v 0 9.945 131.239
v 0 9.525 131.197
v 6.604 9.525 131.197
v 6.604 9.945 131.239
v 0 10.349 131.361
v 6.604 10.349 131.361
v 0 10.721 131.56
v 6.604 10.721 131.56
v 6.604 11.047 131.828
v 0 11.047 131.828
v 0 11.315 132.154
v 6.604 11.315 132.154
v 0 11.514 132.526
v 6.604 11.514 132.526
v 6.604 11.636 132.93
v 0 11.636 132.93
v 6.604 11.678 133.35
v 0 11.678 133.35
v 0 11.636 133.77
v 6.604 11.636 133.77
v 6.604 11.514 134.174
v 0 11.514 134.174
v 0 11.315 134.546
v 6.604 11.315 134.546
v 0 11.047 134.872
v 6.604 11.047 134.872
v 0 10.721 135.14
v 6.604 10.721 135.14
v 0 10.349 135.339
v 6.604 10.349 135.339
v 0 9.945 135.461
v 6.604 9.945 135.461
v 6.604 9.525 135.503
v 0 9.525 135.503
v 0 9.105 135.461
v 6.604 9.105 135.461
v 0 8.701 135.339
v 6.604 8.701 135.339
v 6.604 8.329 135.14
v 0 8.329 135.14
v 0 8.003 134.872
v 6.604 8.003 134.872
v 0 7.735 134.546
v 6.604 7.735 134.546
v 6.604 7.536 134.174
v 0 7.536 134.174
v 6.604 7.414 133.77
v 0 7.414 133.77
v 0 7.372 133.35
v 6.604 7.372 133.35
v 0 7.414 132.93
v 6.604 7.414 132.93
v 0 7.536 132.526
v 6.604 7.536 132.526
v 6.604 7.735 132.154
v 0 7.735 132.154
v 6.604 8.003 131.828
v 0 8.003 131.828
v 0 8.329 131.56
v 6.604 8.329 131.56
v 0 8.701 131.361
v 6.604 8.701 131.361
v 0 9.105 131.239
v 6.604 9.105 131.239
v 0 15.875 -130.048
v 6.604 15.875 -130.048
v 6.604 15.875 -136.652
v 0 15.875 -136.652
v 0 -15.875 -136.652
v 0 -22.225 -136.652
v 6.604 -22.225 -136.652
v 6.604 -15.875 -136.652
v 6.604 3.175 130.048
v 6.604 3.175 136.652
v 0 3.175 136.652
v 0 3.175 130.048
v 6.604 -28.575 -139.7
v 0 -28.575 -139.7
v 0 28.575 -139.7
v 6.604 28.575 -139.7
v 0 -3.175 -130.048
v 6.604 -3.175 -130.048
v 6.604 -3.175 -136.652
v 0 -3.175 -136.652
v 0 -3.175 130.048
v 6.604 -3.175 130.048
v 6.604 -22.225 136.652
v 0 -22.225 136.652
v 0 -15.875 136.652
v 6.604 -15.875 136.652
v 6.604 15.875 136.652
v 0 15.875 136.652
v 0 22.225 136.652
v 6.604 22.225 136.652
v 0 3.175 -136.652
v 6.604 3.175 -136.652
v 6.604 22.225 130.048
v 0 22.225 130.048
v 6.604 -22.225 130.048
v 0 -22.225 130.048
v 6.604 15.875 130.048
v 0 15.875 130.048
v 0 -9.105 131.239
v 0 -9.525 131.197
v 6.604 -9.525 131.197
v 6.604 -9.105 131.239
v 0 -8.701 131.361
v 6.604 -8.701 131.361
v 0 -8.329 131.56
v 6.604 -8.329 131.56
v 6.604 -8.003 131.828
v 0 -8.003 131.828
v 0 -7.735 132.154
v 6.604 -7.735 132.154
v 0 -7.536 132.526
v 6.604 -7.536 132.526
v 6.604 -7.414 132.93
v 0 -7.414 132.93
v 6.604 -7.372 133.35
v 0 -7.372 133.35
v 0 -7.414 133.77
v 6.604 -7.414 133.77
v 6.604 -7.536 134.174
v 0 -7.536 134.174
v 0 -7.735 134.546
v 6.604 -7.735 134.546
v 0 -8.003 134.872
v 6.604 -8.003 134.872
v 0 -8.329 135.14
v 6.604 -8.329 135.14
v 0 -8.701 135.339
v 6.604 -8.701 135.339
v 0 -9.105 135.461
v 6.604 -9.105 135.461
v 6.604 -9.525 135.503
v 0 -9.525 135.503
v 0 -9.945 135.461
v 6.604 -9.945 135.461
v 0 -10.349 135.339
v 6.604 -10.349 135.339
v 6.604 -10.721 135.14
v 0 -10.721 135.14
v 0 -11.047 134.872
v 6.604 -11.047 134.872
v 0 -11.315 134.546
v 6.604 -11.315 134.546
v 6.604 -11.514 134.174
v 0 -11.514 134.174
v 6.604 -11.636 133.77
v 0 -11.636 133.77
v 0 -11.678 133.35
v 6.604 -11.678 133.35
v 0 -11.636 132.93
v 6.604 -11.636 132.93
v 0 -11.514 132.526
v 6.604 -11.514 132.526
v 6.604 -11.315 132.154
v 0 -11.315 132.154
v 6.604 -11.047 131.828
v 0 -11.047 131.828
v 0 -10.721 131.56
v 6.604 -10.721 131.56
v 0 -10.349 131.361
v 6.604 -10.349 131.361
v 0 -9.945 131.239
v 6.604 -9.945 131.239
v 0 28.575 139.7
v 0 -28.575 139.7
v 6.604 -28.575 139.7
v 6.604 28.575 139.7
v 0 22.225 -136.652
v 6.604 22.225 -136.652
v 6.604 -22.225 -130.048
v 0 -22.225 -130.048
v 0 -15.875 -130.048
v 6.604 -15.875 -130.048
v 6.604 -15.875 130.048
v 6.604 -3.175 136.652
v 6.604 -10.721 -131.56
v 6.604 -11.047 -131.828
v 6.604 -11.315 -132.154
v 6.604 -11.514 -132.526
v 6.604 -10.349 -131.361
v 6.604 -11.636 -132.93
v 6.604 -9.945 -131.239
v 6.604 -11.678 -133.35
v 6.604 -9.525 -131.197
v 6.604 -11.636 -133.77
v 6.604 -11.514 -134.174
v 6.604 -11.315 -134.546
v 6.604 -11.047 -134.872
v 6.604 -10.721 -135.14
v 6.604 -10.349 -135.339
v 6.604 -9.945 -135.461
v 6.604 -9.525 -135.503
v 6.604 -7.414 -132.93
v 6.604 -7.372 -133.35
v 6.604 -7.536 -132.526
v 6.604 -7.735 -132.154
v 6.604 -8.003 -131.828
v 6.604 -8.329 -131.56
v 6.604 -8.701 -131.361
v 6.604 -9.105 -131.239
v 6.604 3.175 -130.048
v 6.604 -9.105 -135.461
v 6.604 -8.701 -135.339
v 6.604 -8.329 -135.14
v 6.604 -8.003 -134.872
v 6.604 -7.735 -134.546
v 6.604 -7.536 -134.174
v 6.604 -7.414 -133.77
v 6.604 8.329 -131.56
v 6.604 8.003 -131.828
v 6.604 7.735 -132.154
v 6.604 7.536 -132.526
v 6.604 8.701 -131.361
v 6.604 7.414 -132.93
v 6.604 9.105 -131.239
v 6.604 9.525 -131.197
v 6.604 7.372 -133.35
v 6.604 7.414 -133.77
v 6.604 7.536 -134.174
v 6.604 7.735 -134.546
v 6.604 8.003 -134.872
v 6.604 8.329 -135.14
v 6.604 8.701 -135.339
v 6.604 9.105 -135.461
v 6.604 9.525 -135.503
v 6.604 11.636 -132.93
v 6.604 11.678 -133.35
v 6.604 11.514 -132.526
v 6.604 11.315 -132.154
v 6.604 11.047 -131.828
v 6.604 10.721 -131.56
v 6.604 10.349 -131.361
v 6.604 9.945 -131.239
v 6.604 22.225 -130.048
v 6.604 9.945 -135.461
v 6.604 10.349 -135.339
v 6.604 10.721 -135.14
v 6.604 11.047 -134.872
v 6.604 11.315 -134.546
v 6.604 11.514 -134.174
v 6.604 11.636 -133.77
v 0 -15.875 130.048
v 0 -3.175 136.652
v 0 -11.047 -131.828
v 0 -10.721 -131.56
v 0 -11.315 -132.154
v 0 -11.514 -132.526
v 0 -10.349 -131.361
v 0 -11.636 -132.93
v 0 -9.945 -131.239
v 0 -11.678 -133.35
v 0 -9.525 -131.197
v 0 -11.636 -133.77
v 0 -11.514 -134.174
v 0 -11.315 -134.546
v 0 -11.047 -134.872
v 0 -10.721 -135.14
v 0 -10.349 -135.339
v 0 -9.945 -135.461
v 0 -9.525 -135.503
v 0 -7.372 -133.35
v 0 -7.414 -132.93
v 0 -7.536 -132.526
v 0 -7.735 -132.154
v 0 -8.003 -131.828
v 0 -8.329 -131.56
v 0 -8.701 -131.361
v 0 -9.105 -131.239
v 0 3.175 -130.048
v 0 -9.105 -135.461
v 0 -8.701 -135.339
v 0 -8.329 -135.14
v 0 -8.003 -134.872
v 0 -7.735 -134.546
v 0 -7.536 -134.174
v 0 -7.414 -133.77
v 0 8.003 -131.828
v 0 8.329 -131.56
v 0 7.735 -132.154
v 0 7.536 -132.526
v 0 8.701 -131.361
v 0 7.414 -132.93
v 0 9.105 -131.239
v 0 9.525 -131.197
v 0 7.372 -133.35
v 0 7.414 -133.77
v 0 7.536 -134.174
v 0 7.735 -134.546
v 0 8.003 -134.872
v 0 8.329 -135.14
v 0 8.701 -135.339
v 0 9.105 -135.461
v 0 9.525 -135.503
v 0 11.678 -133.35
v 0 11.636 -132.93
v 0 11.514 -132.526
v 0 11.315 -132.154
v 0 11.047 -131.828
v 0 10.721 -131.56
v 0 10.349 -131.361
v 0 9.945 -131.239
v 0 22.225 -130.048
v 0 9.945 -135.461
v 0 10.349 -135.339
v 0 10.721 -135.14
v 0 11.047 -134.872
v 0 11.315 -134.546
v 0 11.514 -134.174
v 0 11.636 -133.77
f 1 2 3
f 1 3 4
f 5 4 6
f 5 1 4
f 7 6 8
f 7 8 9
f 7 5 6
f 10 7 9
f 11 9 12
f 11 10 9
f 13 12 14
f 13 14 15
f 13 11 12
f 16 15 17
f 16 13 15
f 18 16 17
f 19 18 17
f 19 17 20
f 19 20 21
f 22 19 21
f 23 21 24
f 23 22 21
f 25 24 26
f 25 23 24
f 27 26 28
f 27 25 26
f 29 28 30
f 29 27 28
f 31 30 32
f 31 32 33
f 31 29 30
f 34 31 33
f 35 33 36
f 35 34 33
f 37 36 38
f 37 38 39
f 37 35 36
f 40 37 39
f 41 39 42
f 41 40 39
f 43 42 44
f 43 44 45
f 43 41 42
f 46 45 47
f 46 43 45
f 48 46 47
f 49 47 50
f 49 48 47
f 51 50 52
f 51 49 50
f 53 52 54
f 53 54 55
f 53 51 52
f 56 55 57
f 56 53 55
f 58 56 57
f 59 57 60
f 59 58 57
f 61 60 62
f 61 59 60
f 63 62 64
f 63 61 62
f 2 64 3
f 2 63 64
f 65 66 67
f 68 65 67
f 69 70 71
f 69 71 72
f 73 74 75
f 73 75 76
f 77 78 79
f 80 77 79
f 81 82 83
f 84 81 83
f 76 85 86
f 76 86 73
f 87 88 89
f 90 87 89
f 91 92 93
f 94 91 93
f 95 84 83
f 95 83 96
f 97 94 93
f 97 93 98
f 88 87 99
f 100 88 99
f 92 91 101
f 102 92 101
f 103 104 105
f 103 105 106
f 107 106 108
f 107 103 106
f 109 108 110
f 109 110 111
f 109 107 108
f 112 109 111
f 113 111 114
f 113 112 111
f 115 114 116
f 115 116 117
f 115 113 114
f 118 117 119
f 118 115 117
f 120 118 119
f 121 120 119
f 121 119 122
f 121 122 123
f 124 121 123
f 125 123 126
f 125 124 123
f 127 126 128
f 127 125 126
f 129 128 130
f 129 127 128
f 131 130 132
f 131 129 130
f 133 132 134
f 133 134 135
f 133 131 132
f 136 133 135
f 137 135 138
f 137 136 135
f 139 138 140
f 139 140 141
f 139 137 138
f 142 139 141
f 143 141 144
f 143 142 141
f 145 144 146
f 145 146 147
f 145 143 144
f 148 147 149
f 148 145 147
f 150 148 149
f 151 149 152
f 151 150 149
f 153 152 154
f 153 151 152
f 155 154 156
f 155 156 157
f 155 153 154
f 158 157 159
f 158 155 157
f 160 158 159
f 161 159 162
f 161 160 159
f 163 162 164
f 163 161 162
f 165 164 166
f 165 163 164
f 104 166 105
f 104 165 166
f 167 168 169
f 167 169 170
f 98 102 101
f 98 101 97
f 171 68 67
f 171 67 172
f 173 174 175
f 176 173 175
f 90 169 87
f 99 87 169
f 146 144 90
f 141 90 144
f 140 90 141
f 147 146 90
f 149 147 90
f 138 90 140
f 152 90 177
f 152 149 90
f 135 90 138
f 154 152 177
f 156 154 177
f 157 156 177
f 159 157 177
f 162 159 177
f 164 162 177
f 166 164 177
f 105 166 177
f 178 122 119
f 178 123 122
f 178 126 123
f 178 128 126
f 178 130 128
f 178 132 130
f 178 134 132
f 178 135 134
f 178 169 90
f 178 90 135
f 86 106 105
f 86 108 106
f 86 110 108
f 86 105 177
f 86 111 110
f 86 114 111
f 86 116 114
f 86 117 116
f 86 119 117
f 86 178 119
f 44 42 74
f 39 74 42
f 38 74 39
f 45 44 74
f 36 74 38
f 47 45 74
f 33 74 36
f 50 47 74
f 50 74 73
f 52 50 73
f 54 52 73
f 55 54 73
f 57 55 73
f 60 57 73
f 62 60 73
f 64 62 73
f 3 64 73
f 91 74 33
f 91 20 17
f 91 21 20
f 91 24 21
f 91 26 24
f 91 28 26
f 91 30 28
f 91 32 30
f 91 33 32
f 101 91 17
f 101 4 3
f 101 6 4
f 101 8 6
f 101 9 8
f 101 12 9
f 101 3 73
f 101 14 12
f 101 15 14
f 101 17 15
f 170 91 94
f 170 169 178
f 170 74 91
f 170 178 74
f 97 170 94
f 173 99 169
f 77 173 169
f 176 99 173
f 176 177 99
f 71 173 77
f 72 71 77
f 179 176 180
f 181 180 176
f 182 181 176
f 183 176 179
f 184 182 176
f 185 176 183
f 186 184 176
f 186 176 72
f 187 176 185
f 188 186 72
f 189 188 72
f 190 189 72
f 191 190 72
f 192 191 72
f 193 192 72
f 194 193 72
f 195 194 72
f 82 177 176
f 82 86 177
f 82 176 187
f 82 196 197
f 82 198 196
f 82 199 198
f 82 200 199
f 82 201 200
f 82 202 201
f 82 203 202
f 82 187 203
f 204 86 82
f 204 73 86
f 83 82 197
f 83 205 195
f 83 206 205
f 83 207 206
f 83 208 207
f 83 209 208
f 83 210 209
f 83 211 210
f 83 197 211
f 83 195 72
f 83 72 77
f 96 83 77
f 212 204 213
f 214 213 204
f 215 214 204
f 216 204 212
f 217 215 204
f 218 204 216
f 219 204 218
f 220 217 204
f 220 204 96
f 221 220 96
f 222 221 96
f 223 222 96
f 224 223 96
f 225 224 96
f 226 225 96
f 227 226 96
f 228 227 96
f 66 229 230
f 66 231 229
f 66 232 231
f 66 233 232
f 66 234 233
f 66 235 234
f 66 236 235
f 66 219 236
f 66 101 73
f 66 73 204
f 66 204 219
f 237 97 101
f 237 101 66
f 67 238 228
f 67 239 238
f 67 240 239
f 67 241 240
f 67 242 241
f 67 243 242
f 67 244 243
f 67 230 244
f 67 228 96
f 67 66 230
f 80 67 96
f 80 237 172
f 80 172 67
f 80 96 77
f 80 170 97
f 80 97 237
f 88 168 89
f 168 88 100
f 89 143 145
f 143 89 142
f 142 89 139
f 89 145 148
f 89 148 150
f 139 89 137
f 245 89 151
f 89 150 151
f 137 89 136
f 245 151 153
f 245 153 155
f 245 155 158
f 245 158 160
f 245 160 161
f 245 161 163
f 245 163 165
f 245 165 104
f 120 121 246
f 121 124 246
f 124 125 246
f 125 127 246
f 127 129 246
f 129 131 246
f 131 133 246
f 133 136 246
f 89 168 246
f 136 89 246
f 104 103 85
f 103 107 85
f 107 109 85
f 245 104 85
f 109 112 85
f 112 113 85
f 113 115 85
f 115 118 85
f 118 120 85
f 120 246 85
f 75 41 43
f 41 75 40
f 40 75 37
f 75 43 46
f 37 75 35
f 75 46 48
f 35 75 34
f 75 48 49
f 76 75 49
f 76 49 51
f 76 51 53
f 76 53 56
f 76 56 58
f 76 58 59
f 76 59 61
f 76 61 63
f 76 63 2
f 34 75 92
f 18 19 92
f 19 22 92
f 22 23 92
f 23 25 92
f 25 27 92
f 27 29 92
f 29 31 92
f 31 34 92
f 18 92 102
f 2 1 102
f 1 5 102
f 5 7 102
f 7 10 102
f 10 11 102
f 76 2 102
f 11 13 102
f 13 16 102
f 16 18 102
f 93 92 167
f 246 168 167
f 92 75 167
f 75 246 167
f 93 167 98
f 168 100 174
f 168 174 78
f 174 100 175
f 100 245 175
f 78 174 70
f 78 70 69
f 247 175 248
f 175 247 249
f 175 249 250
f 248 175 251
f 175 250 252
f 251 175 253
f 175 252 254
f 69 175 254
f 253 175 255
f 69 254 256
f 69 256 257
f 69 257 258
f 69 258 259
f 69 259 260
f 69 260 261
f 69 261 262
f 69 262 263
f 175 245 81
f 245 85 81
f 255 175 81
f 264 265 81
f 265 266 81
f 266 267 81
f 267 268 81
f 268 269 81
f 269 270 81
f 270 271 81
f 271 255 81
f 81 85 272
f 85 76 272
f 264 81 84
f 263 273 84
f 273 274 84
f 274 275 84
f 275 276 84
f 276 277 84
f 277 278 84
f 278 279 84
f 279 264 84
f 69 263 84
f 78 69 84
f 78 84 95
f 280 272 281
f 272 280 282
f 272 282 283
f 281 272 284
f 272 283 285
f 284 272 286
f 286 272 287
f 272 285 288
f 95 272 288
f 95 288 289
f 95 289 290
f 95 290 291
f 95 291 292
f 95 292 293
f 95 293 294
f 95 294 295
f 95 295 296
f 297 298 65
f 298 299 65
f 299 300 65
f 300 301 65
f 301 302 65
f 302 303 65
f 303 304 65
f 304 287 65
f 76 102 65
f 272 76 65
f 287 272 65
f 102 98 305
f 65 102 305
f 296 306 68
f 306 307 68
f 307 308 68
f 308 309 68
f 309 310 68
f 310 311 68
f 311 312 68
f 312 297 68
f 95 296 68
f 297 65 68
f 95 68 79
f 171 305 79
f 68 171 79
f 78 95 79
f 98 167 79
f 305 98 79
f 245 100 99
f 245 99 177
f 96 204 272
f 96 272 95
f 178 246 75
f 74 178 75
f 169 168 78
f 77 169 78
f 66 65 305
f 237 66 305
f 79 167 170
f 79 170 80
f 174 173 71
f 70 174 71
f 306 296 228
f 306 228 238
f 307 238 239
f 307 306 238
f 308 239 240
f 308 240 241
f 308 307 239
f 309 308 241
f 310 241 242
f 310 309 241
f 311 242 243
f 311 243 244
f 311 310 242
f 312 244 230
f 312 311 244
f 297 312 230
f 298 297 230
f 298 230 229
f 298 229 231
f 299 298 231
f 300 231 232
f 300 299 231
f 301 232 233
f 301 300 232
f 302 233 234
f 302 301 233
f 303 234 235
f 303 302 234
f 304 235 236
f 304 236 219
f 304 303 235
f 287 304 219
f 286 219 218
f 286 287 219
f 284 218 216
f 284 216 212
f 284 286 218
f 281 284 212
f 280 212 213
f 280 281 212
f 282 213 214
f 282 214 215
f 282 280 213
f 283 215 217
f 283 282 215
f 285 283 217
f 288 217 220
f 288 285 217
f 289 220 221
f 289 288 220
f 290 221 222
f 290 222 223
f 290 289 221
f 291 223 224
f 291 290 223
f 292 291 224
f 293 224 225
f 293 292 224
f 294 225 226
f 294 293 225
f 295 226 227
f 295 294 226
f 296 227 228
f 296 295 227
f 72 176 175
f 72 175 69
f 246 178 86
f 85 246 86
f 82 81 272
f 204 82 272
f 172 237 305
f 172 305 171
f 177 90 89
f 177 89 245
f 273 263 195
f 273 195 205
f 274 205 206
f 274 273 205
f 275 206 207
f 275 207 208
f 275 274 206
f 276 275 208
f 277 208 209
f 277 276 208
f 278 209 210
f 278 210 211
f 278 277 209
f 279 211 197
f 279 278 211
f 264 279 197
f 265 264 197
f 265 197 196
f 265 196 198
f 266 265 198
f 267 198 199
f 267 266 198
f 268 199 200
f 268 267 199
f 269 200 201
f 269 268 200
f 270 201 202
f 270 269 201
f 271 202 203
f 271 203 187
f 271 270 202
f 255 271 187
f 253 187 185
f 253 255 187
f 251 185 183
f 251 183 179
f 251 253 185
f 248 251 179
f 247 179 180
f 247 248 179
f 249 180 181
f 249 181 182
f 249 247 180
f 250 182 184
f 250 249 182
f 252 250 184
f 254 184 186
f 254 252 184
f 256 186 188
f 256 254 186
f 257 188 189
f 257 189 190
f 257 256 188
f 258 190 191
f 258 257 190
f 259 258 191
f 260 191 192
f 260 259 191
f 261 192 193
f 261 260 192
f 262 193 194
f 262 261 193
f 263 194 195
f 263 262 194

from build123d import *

# Parameters (mm, degrees)
SKETCH1_W           = 279.4
SKETCH1_H           = 57.15
SKETCH1_R           = 2.15265
SKETCH1_W_2         = 6.604
SKETCH1_H_2         = 6.35
BOSS_EXTRUDE1_DEPTH = 6.604


with BuildPart() as part:
    # Sketch1 → Boss-Extrude1 (new body)
    with BuildSketch(Plane(origin=(0, 0, 0), x_dir=(0, 0, -1), z_dir=(1, 0, 0))):
        Rectangle(SKETCH1_W, SKETCH1_H)
        with Locations((-133.35, 9.525)):
            Circle(SKETCH1_R, mode=Mode.SUBTRACT)
        with Locations((-133.35, -9.525)):
            Circle(SKETCH1_R, mode=Mode.SUBTRACT)
        with Locations((133.35, 9.525)):
            Circle(SKETCH1_R, mode=Mode.SUBTRACT)
        with Locations((133.35, -9.525)):
            Circle(SKETCH1_R, mode=Mode.SUBTRACT)
        with Locations((-133.35, 0)):
            Rectangle(SKETCH1_W_2, SKETCH1_H_2, mode=Mode.SUBTRACT)
        with Locations((-133.35, 19.05)):
            Rectangle(SKETCH1_W_2, SKETCH1_H_2, mode=Mode.SUBTRACT)
        with Locations((-133.35, -19.05)):
            Rectangle(SKETCH1_W_2, SKETCH1_H_2, mode=Mode.SUBTRACT)
        with Locations((133.35, 0)):
            Rectangle(SKETCH1_W_2, SKETCH1_H_2, mode=Mode.SUBTRACT)
        with Locations((133.35, 19.05)):
            Rectangle(SKETCH1_W_2, SKETCH1_H_2, mode=Mode.SUBTRACT)
        with Locations((133.35, -19.05)):
            Rectangle(SKETCH1_W_2, SKETCH1_H_2, mode=Mode.SUBTRACT)
    extrude(amount=BOSS_EXTRUDE1_DEPTH)


solid = part.part
